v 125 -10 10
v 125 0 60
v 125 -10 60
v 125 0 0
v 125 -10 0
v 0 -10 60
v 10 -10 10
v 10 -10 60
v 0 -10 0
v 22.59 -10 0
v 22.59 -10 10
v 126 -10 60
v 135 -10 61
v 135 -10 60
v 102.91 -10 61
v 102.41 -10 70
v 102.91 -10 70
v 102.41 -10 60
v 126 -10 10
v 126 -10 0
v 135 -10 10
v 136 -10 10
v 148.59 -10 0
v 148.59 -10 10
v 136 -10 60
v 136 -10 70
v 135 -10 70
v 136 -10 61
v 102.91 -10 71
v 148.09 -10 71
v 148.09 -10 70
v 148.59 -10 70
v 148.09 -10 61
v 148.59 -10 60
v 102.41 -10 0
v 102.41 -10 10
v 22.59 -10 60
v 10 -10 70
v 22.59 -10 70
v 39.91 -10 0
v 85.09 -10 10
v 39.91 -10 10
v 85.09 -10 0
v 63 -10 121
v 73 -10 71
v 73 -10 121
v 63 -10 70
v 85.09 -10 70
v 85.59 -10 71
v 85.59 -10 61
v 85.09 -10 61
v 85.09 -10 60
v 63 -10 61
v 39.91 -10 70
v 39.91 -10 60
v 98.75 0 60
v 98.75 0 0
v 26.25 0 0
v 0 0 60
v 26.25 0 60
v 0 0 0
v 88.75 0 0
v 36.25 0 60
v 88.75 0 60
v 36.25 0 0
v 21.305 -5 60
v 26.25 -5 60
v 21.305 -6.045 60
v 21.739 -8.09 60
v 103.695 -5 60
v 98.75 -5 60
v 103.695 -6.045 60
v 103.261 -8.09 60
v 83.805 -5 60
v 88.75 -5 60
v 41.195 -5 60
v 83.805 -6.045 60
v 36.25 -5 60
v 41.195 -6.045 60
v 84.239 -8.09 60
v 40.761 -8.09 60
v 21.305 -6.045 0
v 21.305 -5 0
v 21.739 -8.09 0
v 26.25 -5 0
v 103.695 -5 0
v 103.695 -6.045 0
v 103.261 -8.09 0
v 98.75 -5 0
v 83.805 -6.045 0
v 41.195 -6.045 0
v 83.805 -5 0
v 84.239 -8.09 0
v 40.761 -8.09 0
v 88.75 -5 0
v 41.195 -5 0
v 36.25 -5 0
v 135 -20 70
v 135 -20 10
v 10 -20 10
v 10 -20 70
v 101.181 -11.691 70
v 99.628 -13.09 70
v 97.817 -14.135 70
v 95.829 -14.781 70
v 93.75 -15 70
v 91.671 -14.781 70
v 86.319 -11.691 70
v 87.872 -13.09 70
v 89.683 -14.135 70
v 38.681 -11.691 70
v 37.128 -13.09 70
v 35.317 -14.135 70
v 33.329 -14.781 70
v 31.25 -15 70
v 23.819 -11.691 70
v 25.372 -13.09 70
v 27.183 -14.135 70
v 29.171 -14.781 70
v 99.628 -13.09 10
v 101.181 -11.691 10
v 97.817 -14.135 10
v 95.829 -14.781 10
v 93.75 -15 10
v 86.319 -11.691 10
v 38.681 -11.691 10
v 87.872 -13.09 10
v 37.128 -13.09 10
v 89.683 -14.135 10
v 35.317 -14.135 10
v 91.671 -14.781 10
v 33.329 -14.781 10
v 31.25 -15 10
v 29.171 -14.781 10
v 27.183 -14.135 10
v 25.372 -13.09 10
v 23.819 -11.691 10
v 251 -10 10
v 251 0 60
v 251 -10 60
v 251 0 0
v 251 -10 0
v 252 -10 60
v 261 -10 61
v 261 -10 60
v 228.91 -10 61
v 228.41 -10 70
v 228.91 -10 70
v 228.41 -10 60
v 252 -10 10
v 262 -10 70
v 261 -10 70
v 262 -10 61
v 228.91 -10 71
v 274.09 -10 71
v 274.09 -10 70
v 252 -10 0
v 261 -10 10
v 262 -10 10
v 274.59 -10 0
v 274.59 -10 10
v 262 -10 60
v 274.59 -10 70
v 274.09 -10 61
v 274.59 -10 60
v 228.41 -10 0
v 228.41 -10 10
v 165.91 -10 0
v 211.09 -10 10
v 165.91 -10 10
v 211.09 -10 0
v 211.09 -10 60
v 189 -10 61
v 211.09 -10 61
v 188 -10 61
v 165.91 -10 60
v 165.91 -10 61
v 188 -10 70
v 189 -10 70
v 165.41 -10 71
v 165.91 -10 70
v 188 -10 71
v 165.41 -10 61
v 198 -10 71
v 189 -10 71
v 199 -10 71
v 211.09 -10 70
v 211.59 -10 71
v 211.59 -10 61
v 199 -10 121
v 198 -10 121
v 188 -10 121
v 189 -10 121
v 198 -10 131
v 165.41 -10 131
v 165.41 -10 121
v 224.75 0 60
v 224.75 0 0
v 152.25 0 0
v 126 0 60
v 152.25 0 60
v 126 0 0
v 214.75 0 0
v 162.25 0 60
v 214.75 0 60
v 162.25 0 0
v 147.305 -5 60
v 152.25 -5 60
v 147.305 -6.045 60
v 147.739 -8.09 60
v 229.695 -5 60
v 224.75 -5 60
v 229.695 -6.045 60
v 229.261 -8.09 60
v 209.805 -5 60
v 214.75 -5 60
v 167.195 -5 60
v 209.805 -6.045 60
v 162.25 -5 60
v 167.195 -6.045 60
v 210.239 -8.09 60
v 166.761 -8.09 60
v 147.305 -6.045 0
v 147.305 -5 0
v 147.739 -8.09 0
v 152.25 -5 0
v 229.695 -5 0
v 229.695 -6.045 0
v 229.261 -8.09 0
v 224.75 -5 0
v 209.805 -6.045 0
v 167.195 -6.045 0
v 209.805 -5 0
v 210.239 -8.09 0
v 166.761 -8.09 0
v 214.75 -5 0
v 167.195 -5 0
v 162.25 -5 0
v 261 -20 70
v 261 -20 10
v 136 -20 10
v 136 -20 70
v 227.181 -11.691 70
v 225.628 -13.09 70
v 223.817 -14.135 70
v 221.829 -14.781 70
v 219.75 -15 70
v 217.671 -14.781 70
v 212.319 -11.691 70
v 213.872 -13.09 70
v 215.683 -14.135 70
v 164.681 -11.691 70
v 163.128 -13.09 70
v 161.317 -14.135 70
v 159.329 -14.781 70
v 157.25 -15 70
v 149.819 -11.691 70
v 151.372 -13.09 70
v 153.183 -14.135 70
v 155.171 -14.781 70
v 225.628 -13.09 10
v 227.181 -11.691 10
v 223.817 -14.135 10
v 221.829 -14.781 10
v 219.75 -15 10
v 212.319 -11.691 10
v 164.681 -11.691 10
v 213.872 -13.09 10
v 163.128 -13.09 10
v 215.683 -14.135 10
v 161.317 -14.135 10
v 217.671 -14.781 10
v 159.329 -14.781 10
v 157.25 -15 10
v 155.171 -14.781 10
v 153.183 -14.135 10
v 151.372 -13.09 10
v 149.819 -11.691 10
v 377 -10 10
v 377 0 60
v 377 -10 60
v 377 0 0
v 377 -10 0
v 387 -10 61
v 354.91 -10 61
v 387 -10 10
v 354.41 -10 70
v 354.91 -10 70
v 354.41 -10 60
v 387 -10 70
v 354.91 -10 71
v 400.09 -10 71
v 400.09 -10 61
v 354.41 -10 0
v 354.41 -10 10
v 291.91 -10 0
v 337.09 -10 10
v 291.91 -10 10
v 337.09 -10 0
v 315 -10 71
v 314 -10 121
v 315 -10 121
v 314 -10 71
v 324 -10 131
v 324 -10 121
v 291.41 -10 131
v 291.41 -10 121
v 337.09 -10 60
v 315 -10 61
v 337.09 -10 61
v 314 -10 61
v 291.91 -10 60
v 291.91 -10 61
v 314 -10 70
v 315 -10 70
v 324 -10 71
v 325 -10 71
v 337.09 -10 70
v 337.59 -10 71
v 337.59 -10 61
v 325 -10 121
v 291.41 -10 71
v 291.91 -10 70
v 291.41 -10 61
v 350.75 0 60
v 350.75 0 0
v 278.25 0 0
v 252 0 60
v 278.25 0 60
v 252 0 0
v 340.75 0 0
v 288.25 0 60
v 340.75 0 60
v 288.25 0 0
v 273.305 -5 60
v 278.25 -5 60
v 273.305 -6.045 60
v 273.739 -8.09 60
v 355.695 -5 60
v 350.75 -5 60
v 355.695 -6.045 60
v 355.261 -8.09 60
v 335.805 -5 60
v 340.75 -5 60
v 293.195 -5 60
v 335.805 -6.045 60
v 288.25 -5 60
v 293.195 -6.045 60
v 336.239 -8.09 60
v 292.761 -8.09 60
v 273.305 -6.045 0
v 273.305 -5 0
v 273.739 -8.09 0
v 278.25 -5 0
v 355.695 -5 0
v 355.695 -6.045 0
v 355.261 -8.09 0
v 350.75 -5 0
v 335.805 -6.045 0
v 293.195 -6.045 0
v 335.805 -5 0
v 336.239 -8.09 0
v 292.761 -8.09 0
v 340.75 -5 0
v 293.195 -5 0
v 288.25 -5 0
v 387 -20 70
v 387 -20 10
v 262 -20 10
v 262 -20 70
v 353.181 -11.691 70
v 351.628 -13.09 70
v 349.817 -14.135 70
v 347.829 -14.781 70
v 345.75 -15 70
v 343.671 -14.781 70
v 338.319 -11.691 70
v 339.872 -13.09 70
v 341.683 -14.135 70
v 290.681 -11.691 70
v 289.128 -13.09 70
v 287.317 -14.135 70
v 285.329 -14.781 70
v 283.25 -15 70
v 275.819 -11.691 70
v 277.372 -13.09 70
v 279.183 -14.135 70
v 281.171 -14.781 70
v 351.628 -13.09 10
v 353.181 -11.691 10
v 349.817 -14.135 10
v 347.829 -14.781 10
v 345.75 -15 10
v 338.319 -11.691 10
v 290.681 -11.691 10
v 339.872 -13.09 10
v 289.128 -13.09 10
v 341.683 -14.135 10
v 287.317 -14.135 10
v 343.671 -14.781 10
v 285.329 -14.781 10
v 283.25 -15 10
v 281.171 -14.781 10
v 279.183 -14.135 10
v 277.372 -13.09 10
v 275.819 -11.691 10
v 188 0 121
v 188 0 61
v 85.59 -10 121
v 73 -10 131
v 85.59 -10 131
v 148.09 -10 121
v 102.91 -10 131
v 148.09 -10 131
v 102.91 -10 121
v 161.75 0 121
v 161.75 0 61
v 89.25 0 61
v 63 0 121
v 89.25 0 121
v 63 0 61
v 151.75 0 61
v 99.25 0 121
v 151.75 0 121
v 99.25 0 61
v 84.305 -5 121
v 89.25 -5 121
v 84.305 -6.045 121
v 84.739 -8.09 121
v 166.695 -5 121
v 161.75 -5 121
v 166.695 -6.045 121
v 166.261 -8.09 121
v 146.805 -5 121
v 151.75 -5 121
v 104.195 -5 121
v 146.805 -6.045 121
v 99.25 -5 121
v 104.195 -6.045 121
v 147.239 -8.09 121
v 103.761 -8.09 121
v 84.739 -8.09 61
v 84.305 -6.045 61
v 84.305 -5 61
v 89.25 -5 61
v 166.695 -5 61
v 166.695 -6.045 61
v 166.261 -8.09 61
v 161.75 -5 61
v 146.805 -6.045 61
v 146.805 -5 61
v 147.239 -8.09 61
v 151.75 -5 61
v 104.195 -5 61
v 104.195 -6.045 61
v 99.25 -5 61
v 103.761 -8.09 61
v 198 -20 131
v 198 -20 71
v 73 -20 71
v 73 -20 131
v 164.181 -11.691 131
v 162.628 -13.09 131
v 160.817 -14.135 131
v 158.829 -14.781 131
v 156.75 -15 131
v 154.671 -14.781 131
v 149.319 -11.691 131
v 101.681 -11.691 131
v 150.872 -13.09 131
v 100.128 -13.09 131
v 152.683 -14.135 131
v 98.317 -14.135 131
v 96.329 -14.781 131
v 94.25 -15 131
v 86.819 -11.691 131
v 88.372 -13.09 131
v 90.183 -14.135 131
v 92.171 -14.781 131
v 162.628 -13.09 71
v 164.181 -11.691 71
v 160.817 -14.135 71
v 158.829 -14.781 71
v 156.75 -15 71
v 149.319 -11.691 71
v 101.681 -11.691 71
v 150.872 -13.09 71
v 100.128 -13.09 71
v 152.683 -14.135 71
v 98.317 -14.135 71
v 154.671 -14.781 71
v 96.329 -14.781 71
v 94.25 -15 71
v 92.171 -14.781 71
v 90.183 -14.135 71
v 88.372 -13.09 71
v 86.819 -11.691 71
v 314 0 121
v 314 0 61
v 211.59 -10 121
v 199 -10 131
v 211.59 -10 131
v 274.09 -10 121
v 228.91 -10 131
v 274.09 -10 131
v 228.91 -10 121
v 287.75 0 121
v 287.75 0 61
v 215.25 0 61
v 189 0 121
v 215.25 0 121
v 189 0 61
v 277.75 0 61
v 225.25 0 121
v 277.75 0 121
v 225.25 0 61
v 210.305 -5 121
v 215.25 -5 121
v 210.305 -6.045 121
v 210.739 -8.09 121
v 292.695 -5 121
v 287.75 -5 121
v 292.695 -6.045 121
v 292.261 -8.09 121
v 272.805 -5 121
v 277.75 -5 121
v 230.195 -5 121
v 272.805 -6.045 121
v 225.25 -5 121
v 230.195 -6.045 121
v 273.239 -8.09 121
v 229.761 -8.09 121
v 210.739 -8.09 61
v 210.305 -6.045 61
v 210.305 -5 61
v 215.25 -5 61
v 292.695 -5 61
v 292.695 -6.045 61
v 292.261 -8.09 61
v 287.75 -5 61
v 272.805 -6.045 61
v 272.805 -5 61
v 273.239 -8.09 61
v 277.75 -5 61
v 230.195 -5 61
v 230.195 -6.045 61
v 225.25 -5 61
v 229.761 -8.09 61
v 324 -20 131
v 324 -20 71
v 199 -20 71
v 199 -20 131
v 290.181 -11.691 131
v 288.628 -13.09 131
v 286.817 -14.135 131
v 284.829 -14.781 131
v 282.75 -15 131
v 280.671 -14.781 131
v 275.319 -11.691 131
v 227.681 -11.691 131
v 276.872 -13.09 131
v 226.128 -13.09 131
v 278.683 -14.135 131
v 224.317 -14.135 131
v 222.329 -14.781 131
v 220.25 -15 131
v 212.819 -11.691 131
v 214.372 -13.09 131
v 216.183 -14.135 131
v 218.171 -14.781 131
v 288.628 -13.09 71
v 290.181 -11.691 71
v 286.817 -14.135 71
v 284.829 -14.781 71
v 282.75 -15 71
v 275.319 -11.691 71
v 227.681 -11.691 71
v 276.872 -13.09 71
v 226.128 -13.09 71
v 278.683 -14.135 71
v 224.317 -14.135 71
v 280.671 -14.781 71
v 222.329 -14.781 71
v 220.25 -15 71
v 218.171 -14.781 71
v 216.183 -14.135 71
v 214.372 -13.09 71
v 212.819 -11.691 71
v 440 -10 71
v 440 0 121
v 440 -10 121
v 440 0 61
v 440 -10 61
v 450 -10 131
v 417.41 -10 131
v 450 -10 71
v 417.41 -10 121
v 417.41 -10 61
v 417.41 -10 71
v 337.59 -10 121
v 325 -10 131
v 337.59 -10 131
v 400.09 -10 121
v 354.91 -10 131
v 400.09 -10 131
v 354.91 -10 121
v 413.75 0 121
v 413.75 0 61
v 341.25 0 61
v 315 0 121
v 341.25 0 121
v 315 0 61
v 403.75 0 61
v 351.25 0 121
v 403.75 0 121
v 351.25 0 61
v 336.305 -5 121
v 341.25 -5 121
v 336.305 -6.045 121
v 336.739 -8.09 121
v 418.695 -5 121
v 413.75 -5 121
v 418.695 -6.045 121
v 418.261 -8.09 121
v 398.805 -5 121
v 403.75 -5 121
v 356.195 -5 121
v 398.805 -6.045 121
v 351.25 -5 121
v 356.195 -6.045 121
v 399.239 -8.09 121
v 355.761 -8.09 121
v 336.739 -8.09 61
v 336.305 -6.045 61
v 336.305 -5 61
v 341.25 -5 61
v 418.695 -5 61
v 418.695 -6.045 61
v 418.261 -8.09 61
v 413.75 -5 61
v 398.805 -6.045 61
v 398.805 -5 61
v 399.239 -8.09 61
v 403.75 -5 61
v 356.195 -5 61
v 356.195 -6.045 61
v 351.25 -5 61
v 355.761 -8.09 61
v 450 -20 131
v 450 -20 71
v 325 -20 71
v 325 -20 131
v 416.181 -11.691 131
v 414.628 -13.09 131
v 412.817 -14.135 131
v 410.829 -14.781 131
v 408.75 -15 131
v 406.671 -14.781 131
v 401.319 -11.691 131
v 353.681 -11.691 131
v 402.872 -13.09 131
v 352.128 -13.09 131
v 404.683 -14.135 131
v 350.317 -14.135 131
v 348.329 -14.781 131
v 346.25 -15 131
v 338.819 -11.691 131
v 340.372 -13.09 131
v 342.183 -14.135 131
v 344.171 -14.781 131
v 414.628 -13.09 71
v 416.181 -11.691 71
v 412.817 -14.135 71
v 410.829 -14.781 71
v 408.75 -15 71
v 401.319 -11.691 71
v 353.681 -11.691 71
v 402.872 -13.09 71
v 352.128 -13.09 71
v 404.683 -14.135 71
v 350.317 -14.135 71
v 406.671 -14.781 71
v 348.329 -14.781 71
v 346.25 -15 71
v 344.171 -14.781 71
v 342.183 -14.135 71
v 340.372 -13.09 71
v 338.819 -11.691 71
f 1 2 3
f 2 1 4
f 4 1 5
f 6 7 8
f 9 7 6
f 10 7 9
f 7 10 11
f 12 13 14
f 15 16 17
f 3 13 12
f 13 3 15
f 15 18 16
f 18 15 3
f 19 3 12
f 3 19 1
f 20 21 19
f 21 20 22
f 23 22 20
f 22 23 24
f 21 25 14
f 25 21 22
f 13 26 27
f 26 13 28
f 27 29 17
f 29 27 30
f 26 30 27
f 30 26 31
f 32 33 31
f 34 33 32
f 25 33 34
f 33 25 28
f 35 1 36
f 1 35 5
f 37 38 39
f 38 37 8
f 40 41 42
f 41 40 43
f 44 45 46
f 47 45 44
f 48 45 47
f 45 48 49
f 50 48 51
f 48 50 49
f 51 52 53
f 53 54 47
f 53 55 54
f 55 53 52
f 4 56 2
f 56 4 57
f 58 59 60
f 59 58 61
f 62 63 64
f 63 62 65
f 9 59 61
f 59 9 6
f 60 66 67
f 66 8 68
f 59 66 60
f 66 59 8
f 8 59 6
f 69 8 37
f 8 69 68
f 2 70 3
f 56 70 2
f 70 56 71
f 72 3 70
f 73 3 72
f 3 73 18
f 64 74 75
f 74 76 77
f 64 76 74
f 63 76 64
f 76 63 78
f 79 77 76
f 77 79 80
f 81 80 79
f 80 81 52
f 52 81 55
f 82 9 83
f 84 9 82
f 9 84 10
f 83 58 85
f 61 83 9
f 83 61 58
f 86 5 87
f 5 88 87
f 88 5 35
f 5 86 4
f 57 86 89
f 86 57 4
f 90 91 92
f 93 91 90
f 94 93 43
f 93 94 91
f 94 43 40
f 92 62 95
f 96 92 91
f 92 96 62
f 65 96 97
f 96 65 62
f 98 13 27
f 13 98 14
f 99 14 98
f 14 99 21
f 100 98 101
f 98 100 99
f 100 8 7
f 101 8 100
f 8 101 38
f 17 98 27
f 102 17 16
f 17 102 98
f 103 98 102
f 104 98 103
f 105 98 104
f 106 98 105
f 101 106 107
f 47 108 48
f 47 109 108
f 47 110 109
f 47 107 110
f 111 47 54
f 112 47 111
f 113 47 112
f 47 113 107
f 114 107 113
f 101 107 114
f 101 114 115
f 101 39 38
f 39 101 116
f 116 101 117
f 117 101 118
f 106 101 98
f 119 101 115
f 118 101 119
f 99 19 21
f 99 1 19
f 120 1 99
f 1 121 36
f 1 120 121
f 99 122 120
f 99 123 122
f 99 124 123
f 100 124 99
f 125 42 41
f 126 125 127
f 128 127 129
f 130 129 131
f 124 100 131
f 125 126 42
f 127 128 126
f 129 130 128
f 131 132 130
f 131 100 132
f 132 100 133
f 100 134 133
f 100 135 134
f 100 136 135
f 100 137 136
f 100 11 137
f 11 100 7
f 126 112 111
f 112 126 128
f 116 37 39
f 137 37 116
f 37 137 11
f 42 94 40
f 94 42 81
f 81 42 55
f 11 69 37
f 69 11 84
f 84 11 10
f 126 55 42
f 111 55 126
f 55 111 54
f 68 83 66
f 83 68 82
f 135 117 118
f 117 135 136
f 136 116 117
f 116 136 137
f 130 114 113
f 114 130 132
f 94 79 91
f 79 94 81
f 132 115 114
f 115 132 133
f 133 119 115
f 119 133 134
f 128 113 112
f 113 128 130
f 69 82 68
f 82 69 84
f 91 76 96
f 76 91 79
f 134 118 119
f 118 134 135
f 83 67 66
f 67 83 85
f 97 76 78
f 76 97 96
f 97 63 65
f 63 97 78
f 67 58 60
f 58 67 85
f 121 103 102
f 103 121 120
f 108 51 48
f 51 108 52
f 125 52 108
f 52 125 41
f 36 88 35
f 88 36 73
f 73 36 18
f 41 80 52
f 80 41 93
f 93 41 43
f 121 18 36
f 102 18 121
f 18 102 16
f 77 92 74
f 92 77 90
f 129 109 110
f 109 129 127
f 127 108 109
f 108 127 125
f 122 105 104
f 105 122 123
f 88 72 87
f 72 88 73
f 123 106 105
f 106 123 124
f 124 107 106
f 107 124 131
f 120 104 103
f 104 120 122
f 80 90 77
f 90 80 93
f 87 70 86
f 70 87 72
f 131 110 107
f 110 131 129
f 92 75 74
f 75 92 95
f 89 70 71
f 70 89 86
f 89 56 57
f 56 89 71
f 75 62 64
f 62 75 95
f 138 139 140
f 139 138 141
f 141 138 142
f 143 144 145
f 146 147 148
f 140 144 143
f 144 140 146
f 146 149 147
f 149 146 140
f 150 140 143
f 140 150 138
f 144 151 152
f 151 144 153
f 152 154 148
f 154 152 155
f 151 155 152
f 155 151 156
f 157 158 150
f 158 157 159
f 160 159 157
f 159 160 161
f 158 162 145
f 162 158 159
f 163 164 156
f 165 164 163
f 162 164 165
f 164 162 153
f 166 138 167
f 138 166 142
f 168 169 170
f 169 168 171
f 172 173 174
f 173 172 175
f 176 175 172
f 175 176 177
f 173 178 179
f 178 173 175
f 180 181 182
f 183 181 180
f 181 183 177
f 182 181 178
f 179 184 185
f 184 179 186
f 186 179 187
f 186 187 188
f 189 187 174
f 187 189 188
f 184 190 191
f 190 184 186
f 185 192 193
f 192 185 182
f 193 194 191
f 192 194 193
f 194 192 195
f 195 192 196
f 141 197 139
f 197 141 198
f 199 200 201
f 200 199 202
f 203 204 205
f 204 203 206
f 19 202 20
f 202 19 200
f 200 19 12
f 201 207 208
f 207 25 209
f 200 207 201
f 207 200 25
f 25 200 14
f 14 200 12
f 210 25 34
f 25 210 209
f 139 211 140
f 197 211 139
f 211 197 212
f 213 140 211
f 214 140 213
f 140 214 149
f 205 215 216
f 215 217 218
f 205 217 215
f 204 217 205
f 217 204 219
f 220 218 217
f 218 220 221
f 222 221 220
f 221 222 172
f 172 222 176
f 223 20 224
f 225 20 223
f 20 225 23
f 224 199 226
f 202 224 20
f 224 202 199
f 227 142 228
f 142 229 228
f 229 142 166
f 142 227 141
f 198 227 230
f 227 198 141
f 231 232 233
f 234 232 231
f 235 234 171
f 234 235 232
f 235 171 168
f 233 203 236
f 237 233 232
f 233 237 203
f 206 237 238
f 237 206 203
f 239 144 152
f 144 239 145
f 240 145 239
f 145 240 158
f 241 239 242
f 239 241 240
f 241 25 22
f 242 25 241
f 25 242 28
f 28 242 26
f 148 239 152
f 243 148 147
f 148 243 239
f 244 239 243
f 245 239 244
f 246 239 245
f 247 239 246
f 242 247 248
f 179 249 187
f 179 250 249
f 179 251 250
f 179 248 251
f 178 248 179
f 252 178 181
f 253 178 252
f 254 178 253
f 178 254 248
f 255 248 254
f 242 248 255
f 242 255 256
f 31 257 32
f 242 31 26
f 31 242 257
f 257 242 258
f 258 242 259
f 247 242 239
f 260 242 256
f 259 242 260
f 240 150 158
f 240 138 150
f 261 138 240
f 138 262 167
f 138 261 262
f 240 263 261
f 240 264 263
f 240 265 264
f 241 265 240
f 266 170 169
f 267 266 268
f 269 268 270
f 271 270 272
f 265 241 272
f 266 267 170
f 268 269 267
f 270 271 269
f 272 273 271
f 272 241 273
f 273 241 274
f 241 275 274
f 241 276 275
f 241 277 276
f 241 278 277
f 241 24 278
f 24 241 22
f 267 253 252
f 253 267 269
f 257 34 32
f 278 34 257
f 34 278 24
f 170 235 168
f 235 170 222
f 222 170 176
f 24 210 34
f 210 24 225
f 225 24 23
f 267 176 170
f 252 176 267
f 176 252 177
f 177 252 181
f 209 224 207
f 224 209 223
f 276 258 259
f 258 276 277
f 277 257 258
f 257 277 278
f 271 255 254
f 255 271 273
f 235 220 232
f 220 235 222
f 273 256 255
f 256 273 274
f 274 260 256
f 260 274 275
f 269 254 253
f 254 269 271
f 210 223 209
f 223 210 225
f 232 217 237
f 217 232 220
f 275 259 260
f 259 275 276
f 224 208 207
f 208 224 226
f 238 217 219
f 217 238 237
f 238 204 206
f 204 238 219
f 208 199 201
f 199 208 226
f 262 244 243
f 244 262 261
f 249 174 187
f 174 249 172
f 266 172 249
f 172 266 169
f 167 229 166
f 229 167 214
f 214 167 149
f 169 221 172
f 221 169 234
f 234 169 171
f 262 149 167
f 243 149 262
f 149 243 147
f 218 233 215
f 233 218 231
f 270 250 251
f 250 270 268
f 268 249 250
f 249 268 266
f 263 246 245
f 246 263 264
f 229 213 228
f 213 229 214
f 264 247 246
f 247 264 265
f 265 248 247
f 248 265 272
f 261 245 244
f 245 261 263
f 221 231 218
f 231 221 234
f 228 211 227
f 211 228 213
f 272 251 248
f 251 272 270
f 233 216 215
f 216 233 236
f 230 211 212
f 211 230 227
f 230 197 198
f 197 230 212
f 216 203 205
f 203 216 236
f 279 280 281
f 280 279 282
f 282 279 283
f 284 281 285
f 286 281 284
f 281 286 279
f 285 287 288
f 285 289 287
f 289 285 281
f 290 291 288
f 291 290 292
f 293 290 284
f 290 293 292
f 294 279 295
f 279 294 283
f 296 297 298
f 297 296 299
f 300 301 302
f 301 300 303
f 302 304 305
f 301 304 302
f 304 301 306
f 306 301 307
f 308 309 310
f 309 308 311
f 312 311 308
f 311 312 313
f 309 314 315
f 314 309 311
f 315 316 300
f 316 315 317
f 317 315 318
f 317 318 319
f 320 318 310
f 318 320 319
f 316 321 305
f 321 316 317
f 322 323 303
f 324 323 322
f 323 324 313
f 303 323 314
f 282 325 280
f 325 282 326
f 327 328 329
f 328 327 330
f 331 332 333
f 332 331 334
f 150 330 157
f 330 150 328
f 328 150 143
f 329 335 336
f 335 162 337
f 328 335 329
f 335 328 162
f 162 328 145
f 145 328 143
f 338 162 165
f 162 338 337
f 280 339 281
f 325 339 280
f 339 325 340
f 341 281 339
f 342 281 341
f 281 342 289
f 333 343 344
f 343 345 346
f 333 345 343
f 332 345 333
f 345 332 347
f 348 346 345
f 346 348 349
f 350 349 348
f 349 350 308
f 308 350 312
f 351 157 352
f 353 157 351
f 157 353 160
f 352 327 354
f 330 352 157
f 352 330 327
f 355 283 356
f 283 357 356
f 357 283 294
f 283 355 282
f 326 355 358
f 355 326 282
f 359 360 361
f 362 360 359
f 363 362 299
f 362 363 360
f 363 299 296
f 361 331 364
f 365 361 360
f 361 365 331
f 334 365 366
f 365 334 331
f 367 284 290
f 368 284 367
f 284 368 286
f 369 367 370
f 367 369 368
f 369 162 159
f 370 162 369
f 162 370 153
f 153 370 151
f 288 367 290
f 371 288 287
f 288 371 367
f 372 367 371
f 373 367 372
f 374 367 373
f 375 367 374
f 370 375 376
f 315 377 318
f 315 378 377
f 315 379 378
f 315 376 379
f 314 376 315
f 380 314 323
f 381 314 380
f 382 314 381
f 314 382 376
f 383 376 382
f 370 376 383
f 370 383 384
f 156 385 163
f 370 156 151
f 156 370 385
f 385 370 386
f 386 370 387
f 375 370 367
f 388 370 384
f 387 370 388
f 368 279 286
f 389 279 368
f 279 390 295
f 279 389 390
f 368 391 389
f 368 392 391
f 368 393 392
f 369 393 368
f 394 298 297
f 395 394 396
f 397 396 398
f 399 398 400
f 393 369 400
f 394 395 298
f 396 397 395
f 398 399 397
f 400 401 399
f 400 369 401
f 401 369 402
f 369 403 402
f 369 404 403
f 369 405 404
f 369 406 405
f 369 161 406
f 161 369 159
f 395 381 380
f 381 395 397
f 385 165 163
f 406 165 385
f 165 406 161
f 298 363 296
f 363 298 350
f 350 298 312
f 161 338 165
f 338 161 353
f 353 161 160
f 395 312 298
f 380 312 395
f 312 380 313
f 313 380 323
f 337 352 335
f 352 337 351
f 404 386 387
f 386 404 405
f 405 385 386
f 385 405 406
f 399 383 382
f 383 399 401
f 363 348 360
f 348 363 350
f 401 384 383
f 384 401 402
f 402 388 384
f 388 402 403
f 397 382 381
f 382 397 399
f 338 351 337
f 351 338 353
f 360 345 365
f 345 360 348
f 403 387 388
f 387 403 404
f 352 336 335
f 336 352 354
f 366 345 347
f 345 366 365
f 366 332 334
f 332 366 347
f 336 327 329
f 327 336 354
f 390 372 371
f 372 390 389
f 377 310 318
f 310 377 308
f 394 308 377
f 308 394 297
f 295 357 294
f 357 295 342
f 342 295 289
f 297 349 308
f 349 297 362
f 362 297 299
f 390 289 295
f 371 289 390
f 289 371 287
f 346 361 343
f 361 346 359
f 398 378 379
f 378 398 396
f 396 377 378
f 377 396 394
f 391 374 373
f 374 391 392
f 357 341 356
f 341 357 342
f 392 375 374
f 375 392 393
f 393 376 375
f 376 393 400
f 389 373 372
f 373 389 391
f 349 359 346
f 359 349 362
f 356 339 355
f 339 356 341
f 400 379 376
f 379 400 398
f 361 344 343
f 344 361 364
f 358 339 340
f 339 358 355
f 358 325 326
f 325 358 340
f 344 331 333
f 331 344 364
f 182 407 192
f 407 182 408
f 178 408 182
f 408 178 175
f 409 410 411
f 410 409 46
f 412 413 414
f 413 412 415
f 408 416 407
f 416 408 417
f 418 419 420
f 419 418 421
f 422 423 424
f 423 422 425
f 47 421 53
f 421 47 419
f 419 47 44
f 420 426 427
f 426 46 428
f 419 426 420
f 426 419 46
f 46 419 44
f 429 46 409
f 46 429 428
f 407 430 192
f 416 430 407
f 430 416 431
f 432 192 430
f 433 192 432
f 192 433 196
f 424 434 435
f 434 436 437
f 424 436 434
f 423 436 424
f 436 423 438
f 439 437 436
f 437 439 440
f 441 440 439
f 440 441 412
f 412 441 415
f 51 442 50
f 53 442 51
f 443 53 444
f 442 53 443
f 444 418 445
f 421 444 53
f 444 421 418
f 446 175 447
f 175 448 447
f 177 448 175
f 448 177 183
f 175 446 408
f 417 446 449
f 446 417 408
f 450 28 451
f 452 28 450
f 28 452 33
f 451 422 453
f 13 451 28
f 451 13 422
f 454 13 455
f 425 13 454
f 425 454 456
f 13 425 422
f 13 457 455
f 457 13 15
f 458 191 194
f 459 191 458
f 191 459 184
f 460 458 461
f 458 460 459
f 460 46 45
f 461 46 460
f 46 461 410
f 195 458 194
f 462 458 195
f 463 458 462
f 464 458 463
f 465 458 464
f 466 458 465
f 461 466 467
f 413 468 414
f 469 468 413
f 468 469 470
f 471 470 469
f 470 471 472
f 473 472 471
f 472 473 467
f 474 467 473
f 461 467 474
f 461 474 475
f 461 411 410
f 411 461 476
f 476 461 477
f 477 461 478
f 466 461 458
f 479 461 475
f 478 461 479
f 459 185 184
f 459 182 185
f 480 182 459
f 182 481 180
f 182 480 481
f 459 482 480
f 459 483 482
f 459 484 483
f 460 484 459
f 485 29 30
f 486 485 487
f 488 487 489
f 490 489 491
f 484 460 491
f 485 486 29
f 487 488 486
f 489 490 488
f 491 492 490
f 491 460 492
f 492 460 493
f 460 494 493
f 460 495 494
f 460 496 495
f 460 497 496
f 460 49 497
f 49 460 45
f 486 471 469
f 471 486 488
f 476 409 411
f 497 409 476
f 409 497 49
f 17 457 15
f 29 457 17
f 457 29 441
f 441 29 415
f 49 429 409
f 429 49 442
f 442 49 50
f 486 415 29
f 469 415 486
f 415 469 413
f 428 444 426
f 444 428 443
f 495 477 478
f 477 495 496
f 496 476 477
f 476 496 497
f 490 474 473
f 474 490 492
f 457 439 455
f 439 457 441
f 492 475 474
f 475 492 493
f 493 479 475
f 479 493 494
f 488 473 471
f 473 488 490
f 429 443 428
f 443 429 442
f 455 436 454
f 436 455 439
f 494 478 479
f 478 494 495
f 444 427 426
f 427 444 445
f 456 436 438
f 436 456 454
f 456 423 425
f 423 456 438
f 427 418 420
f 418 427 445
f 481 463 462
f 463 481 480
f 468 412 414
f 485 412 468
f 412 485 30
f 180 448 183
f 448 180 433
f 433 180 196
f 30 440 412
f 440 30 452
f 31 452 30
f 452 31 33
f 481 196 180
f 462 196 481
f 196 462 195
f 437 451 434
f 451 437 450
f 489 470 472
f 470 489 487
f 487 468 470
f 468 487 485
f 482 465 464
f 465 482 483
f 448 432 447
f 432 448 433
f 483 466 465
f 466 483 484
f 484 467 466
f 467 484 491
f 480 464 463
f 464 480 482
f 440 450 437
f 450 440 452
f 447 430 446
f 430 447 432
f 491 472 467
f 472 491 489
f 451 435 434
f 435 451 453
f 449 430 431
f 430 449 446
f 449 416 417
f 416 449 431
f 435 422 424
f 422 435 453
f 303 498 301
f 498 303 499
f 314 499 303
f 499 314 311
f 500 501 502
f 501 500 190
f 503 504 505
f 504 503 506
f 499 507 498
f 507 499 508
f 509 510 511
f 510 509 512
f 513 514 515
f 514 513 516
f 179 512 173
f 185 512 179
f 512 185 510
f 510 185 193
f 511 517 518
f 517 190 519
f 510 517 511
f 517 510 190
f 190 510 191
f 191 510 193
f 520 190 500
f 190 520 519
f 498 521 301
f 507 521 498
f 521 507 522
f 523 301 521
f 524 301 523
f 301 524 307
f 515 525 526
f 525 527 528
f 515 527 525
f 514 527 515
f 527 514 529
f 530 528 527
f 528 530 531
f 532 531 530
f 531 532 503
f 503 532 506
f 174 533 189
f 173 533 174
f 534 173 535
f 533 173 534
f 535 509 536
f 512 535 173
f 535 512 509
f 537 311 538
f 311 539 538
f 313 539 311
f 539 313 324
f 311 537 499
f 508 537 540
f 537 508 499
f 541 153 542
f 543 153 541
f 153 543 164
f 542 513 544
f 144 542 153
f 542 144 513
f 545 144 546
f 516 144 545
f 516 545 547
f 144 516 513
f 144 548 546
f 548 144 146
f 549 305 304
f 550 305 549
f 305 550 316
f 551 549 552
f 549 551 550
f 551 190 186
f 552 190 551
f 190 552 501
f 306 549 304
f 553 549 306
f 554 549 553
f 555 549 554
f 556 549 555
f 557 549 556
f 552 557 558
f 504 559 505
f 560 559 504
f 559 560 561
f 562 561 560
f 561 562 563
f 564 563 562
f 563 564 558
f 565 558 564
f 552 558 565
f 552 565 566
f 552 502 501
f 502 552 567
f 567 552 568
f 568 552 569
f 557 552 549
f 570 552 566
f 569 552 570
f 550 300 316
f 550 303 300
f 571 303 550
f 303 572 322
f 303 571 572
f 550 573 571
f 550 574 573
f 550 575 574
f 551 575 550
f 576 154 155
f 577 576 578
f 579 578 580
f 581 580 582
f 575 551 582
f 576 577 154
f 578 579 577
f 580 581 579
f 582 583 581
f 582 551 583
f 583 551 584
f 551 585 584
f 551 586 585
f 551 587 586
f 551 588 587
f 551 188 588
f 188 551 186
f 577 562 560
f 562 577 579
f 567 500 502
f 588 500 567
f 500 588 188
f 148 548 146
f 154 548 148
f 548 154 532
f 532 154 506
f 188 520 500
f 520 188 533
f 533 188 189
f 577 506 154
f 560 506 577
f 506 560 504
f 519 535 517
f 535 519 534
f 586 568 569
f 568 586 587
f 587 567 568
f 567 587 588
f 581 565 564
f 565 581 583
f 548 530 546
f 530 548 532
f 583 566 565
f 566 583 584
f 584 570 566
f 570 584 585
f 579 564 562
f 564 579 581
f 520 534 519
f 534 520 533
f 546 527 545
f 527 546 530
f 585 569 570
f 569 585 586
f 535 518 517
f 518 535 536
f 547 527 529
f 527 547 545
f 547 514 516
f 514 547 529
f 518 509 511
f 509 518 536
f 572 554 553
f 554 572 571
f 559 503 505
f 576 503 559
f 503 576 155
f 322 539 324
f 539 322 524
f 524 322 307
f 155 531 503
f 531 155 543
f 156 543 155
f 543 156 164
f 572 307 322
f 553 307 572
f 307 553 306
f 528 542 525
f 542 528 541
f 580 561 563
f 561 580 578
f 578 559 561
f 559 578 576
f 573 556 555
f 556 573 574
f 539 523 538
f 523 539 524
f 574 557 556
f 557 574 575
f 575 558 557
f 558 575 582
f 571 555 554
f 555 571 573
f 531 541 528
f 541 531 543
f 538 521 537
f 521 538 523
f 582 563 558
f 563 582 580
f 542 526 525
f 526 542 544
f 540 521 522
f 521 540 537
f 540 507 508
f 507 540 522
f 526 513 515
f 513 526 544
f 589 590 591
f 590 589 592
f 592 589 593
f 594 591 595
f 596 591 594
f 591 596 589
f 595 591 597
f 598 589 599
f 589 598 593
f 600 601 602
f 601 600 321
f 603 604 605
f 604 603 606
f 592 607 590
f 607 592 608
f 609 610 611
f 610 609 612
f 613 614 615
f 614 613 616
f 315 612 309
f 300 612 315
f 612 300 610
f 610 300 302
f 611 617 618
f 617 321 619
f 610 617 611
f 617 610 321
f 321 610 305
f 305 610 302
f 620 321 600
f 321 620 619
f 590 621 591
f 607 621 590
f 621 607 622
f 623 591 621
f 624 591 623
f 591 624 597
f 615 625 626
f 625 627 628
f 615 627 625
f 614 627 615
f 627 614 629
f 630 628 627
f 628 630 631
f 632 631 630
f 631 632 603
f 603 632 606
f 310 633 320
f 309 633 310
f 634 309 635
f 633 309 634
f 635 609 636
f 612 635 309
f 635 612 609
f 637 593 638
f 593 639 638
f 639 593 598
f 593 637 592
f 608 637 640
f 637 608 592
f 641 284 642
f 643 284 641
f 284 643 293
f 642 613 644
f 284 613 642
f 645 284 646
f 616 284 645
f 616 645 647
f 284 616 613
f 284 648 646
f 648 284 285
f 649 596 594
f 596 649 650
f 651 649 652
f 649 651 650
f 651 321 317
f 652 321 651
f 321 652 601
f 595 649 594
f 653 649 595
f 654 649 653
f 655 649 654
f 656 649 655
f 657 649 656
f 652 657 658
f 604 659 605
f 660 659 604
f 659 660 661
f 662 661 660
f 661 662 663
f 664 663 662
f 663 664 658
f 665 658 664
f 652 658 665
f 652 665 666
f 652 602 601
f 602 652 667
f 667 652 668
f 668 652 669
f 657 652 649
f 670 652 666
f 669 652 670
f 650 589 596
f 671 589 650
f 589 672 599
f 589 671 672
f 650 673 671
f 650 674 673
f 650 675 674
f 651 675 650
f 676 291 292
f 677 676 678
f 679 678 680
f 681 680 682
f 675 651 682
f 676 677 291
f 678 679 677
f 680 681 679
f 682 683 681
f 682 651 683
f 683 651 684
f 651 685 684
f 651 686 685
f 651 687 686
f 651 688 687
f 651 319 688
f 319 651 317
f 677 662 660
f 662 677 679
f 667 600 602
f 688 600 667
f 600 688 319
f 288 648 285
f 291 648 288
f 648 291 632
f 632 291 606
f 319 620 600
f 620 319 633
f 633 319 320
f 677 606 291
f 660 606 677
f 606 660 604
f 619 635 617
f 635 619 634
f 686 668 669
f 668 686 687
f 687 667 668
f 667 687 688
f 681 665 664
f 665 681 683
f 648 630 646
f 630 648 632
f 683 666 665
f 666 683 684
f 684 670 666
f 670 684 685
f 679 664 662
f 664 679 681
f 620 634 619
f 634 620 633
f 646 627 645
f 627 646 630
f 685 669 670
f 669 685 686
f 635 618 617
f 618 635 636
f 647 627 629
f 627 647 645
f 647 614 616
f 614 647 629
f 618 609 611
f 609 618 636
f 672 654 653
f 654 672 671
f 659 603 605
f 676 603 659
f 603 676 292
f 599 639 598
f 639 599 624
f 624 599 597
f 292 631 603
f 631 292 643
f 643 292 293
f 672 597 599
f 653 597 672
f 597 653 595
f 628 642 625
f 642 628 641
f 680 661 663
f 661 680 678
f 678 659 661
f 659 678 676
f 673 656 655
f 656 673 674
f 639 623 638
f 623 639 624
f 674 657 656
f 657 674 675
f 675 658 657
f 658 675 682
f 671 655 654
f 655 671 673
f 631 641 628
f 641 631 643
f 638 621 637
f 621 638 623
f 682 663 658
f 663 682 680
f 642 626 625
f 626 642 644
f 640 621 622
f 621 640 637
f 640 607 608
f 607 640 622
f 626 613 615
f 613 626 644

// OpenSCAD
// file: fullbrick.scad
module ckey(theh)
{
        halfcylinder(theh);
        translate([5,0,0]) rotate([-90,90,0]) cube([10,10,theh]);
}

module halfcylinder(theh)
{
      difference(){
        rotate([-90,90,0]) cylinder(h=theh,r=10);
        rotate([-90,90,0]) translate([0,-10,-1]) cube([20,20,theh+2]);
      }
}



module basebrick(bh,bl)
{
    cube([bl,bh,10]);
    translate([10,10,10]) cube([bl,bh,10]);
}

module brick(bl,bh)
{   
    difference(){
        basebrick(bh,bl);
        translate([bl*.25,-10,5]) ckey(160);
        translate([bl*.75,-10,5]) ckey(160);
        }
    
}

brick(125,60);
// main file
use <fullbrick.scad>;



    translate([0,0,0]) rotate([90,0,0]) brick(125,60);
    translate([126,0,0]) rotate([90,0,0]) brick(125,60);
    translate([252,0,0]) rotate([90,0,0]) brick(125,60);
    
    translate([  0+63,0,61]) rotate([90,0,0]) brick(125,60);
    translate([126+63,0,61]) rotate([90,0,0]) brick(125,60);
    translate([252+63,0,61]) rotate([90,0,0]) brick(125,60);
